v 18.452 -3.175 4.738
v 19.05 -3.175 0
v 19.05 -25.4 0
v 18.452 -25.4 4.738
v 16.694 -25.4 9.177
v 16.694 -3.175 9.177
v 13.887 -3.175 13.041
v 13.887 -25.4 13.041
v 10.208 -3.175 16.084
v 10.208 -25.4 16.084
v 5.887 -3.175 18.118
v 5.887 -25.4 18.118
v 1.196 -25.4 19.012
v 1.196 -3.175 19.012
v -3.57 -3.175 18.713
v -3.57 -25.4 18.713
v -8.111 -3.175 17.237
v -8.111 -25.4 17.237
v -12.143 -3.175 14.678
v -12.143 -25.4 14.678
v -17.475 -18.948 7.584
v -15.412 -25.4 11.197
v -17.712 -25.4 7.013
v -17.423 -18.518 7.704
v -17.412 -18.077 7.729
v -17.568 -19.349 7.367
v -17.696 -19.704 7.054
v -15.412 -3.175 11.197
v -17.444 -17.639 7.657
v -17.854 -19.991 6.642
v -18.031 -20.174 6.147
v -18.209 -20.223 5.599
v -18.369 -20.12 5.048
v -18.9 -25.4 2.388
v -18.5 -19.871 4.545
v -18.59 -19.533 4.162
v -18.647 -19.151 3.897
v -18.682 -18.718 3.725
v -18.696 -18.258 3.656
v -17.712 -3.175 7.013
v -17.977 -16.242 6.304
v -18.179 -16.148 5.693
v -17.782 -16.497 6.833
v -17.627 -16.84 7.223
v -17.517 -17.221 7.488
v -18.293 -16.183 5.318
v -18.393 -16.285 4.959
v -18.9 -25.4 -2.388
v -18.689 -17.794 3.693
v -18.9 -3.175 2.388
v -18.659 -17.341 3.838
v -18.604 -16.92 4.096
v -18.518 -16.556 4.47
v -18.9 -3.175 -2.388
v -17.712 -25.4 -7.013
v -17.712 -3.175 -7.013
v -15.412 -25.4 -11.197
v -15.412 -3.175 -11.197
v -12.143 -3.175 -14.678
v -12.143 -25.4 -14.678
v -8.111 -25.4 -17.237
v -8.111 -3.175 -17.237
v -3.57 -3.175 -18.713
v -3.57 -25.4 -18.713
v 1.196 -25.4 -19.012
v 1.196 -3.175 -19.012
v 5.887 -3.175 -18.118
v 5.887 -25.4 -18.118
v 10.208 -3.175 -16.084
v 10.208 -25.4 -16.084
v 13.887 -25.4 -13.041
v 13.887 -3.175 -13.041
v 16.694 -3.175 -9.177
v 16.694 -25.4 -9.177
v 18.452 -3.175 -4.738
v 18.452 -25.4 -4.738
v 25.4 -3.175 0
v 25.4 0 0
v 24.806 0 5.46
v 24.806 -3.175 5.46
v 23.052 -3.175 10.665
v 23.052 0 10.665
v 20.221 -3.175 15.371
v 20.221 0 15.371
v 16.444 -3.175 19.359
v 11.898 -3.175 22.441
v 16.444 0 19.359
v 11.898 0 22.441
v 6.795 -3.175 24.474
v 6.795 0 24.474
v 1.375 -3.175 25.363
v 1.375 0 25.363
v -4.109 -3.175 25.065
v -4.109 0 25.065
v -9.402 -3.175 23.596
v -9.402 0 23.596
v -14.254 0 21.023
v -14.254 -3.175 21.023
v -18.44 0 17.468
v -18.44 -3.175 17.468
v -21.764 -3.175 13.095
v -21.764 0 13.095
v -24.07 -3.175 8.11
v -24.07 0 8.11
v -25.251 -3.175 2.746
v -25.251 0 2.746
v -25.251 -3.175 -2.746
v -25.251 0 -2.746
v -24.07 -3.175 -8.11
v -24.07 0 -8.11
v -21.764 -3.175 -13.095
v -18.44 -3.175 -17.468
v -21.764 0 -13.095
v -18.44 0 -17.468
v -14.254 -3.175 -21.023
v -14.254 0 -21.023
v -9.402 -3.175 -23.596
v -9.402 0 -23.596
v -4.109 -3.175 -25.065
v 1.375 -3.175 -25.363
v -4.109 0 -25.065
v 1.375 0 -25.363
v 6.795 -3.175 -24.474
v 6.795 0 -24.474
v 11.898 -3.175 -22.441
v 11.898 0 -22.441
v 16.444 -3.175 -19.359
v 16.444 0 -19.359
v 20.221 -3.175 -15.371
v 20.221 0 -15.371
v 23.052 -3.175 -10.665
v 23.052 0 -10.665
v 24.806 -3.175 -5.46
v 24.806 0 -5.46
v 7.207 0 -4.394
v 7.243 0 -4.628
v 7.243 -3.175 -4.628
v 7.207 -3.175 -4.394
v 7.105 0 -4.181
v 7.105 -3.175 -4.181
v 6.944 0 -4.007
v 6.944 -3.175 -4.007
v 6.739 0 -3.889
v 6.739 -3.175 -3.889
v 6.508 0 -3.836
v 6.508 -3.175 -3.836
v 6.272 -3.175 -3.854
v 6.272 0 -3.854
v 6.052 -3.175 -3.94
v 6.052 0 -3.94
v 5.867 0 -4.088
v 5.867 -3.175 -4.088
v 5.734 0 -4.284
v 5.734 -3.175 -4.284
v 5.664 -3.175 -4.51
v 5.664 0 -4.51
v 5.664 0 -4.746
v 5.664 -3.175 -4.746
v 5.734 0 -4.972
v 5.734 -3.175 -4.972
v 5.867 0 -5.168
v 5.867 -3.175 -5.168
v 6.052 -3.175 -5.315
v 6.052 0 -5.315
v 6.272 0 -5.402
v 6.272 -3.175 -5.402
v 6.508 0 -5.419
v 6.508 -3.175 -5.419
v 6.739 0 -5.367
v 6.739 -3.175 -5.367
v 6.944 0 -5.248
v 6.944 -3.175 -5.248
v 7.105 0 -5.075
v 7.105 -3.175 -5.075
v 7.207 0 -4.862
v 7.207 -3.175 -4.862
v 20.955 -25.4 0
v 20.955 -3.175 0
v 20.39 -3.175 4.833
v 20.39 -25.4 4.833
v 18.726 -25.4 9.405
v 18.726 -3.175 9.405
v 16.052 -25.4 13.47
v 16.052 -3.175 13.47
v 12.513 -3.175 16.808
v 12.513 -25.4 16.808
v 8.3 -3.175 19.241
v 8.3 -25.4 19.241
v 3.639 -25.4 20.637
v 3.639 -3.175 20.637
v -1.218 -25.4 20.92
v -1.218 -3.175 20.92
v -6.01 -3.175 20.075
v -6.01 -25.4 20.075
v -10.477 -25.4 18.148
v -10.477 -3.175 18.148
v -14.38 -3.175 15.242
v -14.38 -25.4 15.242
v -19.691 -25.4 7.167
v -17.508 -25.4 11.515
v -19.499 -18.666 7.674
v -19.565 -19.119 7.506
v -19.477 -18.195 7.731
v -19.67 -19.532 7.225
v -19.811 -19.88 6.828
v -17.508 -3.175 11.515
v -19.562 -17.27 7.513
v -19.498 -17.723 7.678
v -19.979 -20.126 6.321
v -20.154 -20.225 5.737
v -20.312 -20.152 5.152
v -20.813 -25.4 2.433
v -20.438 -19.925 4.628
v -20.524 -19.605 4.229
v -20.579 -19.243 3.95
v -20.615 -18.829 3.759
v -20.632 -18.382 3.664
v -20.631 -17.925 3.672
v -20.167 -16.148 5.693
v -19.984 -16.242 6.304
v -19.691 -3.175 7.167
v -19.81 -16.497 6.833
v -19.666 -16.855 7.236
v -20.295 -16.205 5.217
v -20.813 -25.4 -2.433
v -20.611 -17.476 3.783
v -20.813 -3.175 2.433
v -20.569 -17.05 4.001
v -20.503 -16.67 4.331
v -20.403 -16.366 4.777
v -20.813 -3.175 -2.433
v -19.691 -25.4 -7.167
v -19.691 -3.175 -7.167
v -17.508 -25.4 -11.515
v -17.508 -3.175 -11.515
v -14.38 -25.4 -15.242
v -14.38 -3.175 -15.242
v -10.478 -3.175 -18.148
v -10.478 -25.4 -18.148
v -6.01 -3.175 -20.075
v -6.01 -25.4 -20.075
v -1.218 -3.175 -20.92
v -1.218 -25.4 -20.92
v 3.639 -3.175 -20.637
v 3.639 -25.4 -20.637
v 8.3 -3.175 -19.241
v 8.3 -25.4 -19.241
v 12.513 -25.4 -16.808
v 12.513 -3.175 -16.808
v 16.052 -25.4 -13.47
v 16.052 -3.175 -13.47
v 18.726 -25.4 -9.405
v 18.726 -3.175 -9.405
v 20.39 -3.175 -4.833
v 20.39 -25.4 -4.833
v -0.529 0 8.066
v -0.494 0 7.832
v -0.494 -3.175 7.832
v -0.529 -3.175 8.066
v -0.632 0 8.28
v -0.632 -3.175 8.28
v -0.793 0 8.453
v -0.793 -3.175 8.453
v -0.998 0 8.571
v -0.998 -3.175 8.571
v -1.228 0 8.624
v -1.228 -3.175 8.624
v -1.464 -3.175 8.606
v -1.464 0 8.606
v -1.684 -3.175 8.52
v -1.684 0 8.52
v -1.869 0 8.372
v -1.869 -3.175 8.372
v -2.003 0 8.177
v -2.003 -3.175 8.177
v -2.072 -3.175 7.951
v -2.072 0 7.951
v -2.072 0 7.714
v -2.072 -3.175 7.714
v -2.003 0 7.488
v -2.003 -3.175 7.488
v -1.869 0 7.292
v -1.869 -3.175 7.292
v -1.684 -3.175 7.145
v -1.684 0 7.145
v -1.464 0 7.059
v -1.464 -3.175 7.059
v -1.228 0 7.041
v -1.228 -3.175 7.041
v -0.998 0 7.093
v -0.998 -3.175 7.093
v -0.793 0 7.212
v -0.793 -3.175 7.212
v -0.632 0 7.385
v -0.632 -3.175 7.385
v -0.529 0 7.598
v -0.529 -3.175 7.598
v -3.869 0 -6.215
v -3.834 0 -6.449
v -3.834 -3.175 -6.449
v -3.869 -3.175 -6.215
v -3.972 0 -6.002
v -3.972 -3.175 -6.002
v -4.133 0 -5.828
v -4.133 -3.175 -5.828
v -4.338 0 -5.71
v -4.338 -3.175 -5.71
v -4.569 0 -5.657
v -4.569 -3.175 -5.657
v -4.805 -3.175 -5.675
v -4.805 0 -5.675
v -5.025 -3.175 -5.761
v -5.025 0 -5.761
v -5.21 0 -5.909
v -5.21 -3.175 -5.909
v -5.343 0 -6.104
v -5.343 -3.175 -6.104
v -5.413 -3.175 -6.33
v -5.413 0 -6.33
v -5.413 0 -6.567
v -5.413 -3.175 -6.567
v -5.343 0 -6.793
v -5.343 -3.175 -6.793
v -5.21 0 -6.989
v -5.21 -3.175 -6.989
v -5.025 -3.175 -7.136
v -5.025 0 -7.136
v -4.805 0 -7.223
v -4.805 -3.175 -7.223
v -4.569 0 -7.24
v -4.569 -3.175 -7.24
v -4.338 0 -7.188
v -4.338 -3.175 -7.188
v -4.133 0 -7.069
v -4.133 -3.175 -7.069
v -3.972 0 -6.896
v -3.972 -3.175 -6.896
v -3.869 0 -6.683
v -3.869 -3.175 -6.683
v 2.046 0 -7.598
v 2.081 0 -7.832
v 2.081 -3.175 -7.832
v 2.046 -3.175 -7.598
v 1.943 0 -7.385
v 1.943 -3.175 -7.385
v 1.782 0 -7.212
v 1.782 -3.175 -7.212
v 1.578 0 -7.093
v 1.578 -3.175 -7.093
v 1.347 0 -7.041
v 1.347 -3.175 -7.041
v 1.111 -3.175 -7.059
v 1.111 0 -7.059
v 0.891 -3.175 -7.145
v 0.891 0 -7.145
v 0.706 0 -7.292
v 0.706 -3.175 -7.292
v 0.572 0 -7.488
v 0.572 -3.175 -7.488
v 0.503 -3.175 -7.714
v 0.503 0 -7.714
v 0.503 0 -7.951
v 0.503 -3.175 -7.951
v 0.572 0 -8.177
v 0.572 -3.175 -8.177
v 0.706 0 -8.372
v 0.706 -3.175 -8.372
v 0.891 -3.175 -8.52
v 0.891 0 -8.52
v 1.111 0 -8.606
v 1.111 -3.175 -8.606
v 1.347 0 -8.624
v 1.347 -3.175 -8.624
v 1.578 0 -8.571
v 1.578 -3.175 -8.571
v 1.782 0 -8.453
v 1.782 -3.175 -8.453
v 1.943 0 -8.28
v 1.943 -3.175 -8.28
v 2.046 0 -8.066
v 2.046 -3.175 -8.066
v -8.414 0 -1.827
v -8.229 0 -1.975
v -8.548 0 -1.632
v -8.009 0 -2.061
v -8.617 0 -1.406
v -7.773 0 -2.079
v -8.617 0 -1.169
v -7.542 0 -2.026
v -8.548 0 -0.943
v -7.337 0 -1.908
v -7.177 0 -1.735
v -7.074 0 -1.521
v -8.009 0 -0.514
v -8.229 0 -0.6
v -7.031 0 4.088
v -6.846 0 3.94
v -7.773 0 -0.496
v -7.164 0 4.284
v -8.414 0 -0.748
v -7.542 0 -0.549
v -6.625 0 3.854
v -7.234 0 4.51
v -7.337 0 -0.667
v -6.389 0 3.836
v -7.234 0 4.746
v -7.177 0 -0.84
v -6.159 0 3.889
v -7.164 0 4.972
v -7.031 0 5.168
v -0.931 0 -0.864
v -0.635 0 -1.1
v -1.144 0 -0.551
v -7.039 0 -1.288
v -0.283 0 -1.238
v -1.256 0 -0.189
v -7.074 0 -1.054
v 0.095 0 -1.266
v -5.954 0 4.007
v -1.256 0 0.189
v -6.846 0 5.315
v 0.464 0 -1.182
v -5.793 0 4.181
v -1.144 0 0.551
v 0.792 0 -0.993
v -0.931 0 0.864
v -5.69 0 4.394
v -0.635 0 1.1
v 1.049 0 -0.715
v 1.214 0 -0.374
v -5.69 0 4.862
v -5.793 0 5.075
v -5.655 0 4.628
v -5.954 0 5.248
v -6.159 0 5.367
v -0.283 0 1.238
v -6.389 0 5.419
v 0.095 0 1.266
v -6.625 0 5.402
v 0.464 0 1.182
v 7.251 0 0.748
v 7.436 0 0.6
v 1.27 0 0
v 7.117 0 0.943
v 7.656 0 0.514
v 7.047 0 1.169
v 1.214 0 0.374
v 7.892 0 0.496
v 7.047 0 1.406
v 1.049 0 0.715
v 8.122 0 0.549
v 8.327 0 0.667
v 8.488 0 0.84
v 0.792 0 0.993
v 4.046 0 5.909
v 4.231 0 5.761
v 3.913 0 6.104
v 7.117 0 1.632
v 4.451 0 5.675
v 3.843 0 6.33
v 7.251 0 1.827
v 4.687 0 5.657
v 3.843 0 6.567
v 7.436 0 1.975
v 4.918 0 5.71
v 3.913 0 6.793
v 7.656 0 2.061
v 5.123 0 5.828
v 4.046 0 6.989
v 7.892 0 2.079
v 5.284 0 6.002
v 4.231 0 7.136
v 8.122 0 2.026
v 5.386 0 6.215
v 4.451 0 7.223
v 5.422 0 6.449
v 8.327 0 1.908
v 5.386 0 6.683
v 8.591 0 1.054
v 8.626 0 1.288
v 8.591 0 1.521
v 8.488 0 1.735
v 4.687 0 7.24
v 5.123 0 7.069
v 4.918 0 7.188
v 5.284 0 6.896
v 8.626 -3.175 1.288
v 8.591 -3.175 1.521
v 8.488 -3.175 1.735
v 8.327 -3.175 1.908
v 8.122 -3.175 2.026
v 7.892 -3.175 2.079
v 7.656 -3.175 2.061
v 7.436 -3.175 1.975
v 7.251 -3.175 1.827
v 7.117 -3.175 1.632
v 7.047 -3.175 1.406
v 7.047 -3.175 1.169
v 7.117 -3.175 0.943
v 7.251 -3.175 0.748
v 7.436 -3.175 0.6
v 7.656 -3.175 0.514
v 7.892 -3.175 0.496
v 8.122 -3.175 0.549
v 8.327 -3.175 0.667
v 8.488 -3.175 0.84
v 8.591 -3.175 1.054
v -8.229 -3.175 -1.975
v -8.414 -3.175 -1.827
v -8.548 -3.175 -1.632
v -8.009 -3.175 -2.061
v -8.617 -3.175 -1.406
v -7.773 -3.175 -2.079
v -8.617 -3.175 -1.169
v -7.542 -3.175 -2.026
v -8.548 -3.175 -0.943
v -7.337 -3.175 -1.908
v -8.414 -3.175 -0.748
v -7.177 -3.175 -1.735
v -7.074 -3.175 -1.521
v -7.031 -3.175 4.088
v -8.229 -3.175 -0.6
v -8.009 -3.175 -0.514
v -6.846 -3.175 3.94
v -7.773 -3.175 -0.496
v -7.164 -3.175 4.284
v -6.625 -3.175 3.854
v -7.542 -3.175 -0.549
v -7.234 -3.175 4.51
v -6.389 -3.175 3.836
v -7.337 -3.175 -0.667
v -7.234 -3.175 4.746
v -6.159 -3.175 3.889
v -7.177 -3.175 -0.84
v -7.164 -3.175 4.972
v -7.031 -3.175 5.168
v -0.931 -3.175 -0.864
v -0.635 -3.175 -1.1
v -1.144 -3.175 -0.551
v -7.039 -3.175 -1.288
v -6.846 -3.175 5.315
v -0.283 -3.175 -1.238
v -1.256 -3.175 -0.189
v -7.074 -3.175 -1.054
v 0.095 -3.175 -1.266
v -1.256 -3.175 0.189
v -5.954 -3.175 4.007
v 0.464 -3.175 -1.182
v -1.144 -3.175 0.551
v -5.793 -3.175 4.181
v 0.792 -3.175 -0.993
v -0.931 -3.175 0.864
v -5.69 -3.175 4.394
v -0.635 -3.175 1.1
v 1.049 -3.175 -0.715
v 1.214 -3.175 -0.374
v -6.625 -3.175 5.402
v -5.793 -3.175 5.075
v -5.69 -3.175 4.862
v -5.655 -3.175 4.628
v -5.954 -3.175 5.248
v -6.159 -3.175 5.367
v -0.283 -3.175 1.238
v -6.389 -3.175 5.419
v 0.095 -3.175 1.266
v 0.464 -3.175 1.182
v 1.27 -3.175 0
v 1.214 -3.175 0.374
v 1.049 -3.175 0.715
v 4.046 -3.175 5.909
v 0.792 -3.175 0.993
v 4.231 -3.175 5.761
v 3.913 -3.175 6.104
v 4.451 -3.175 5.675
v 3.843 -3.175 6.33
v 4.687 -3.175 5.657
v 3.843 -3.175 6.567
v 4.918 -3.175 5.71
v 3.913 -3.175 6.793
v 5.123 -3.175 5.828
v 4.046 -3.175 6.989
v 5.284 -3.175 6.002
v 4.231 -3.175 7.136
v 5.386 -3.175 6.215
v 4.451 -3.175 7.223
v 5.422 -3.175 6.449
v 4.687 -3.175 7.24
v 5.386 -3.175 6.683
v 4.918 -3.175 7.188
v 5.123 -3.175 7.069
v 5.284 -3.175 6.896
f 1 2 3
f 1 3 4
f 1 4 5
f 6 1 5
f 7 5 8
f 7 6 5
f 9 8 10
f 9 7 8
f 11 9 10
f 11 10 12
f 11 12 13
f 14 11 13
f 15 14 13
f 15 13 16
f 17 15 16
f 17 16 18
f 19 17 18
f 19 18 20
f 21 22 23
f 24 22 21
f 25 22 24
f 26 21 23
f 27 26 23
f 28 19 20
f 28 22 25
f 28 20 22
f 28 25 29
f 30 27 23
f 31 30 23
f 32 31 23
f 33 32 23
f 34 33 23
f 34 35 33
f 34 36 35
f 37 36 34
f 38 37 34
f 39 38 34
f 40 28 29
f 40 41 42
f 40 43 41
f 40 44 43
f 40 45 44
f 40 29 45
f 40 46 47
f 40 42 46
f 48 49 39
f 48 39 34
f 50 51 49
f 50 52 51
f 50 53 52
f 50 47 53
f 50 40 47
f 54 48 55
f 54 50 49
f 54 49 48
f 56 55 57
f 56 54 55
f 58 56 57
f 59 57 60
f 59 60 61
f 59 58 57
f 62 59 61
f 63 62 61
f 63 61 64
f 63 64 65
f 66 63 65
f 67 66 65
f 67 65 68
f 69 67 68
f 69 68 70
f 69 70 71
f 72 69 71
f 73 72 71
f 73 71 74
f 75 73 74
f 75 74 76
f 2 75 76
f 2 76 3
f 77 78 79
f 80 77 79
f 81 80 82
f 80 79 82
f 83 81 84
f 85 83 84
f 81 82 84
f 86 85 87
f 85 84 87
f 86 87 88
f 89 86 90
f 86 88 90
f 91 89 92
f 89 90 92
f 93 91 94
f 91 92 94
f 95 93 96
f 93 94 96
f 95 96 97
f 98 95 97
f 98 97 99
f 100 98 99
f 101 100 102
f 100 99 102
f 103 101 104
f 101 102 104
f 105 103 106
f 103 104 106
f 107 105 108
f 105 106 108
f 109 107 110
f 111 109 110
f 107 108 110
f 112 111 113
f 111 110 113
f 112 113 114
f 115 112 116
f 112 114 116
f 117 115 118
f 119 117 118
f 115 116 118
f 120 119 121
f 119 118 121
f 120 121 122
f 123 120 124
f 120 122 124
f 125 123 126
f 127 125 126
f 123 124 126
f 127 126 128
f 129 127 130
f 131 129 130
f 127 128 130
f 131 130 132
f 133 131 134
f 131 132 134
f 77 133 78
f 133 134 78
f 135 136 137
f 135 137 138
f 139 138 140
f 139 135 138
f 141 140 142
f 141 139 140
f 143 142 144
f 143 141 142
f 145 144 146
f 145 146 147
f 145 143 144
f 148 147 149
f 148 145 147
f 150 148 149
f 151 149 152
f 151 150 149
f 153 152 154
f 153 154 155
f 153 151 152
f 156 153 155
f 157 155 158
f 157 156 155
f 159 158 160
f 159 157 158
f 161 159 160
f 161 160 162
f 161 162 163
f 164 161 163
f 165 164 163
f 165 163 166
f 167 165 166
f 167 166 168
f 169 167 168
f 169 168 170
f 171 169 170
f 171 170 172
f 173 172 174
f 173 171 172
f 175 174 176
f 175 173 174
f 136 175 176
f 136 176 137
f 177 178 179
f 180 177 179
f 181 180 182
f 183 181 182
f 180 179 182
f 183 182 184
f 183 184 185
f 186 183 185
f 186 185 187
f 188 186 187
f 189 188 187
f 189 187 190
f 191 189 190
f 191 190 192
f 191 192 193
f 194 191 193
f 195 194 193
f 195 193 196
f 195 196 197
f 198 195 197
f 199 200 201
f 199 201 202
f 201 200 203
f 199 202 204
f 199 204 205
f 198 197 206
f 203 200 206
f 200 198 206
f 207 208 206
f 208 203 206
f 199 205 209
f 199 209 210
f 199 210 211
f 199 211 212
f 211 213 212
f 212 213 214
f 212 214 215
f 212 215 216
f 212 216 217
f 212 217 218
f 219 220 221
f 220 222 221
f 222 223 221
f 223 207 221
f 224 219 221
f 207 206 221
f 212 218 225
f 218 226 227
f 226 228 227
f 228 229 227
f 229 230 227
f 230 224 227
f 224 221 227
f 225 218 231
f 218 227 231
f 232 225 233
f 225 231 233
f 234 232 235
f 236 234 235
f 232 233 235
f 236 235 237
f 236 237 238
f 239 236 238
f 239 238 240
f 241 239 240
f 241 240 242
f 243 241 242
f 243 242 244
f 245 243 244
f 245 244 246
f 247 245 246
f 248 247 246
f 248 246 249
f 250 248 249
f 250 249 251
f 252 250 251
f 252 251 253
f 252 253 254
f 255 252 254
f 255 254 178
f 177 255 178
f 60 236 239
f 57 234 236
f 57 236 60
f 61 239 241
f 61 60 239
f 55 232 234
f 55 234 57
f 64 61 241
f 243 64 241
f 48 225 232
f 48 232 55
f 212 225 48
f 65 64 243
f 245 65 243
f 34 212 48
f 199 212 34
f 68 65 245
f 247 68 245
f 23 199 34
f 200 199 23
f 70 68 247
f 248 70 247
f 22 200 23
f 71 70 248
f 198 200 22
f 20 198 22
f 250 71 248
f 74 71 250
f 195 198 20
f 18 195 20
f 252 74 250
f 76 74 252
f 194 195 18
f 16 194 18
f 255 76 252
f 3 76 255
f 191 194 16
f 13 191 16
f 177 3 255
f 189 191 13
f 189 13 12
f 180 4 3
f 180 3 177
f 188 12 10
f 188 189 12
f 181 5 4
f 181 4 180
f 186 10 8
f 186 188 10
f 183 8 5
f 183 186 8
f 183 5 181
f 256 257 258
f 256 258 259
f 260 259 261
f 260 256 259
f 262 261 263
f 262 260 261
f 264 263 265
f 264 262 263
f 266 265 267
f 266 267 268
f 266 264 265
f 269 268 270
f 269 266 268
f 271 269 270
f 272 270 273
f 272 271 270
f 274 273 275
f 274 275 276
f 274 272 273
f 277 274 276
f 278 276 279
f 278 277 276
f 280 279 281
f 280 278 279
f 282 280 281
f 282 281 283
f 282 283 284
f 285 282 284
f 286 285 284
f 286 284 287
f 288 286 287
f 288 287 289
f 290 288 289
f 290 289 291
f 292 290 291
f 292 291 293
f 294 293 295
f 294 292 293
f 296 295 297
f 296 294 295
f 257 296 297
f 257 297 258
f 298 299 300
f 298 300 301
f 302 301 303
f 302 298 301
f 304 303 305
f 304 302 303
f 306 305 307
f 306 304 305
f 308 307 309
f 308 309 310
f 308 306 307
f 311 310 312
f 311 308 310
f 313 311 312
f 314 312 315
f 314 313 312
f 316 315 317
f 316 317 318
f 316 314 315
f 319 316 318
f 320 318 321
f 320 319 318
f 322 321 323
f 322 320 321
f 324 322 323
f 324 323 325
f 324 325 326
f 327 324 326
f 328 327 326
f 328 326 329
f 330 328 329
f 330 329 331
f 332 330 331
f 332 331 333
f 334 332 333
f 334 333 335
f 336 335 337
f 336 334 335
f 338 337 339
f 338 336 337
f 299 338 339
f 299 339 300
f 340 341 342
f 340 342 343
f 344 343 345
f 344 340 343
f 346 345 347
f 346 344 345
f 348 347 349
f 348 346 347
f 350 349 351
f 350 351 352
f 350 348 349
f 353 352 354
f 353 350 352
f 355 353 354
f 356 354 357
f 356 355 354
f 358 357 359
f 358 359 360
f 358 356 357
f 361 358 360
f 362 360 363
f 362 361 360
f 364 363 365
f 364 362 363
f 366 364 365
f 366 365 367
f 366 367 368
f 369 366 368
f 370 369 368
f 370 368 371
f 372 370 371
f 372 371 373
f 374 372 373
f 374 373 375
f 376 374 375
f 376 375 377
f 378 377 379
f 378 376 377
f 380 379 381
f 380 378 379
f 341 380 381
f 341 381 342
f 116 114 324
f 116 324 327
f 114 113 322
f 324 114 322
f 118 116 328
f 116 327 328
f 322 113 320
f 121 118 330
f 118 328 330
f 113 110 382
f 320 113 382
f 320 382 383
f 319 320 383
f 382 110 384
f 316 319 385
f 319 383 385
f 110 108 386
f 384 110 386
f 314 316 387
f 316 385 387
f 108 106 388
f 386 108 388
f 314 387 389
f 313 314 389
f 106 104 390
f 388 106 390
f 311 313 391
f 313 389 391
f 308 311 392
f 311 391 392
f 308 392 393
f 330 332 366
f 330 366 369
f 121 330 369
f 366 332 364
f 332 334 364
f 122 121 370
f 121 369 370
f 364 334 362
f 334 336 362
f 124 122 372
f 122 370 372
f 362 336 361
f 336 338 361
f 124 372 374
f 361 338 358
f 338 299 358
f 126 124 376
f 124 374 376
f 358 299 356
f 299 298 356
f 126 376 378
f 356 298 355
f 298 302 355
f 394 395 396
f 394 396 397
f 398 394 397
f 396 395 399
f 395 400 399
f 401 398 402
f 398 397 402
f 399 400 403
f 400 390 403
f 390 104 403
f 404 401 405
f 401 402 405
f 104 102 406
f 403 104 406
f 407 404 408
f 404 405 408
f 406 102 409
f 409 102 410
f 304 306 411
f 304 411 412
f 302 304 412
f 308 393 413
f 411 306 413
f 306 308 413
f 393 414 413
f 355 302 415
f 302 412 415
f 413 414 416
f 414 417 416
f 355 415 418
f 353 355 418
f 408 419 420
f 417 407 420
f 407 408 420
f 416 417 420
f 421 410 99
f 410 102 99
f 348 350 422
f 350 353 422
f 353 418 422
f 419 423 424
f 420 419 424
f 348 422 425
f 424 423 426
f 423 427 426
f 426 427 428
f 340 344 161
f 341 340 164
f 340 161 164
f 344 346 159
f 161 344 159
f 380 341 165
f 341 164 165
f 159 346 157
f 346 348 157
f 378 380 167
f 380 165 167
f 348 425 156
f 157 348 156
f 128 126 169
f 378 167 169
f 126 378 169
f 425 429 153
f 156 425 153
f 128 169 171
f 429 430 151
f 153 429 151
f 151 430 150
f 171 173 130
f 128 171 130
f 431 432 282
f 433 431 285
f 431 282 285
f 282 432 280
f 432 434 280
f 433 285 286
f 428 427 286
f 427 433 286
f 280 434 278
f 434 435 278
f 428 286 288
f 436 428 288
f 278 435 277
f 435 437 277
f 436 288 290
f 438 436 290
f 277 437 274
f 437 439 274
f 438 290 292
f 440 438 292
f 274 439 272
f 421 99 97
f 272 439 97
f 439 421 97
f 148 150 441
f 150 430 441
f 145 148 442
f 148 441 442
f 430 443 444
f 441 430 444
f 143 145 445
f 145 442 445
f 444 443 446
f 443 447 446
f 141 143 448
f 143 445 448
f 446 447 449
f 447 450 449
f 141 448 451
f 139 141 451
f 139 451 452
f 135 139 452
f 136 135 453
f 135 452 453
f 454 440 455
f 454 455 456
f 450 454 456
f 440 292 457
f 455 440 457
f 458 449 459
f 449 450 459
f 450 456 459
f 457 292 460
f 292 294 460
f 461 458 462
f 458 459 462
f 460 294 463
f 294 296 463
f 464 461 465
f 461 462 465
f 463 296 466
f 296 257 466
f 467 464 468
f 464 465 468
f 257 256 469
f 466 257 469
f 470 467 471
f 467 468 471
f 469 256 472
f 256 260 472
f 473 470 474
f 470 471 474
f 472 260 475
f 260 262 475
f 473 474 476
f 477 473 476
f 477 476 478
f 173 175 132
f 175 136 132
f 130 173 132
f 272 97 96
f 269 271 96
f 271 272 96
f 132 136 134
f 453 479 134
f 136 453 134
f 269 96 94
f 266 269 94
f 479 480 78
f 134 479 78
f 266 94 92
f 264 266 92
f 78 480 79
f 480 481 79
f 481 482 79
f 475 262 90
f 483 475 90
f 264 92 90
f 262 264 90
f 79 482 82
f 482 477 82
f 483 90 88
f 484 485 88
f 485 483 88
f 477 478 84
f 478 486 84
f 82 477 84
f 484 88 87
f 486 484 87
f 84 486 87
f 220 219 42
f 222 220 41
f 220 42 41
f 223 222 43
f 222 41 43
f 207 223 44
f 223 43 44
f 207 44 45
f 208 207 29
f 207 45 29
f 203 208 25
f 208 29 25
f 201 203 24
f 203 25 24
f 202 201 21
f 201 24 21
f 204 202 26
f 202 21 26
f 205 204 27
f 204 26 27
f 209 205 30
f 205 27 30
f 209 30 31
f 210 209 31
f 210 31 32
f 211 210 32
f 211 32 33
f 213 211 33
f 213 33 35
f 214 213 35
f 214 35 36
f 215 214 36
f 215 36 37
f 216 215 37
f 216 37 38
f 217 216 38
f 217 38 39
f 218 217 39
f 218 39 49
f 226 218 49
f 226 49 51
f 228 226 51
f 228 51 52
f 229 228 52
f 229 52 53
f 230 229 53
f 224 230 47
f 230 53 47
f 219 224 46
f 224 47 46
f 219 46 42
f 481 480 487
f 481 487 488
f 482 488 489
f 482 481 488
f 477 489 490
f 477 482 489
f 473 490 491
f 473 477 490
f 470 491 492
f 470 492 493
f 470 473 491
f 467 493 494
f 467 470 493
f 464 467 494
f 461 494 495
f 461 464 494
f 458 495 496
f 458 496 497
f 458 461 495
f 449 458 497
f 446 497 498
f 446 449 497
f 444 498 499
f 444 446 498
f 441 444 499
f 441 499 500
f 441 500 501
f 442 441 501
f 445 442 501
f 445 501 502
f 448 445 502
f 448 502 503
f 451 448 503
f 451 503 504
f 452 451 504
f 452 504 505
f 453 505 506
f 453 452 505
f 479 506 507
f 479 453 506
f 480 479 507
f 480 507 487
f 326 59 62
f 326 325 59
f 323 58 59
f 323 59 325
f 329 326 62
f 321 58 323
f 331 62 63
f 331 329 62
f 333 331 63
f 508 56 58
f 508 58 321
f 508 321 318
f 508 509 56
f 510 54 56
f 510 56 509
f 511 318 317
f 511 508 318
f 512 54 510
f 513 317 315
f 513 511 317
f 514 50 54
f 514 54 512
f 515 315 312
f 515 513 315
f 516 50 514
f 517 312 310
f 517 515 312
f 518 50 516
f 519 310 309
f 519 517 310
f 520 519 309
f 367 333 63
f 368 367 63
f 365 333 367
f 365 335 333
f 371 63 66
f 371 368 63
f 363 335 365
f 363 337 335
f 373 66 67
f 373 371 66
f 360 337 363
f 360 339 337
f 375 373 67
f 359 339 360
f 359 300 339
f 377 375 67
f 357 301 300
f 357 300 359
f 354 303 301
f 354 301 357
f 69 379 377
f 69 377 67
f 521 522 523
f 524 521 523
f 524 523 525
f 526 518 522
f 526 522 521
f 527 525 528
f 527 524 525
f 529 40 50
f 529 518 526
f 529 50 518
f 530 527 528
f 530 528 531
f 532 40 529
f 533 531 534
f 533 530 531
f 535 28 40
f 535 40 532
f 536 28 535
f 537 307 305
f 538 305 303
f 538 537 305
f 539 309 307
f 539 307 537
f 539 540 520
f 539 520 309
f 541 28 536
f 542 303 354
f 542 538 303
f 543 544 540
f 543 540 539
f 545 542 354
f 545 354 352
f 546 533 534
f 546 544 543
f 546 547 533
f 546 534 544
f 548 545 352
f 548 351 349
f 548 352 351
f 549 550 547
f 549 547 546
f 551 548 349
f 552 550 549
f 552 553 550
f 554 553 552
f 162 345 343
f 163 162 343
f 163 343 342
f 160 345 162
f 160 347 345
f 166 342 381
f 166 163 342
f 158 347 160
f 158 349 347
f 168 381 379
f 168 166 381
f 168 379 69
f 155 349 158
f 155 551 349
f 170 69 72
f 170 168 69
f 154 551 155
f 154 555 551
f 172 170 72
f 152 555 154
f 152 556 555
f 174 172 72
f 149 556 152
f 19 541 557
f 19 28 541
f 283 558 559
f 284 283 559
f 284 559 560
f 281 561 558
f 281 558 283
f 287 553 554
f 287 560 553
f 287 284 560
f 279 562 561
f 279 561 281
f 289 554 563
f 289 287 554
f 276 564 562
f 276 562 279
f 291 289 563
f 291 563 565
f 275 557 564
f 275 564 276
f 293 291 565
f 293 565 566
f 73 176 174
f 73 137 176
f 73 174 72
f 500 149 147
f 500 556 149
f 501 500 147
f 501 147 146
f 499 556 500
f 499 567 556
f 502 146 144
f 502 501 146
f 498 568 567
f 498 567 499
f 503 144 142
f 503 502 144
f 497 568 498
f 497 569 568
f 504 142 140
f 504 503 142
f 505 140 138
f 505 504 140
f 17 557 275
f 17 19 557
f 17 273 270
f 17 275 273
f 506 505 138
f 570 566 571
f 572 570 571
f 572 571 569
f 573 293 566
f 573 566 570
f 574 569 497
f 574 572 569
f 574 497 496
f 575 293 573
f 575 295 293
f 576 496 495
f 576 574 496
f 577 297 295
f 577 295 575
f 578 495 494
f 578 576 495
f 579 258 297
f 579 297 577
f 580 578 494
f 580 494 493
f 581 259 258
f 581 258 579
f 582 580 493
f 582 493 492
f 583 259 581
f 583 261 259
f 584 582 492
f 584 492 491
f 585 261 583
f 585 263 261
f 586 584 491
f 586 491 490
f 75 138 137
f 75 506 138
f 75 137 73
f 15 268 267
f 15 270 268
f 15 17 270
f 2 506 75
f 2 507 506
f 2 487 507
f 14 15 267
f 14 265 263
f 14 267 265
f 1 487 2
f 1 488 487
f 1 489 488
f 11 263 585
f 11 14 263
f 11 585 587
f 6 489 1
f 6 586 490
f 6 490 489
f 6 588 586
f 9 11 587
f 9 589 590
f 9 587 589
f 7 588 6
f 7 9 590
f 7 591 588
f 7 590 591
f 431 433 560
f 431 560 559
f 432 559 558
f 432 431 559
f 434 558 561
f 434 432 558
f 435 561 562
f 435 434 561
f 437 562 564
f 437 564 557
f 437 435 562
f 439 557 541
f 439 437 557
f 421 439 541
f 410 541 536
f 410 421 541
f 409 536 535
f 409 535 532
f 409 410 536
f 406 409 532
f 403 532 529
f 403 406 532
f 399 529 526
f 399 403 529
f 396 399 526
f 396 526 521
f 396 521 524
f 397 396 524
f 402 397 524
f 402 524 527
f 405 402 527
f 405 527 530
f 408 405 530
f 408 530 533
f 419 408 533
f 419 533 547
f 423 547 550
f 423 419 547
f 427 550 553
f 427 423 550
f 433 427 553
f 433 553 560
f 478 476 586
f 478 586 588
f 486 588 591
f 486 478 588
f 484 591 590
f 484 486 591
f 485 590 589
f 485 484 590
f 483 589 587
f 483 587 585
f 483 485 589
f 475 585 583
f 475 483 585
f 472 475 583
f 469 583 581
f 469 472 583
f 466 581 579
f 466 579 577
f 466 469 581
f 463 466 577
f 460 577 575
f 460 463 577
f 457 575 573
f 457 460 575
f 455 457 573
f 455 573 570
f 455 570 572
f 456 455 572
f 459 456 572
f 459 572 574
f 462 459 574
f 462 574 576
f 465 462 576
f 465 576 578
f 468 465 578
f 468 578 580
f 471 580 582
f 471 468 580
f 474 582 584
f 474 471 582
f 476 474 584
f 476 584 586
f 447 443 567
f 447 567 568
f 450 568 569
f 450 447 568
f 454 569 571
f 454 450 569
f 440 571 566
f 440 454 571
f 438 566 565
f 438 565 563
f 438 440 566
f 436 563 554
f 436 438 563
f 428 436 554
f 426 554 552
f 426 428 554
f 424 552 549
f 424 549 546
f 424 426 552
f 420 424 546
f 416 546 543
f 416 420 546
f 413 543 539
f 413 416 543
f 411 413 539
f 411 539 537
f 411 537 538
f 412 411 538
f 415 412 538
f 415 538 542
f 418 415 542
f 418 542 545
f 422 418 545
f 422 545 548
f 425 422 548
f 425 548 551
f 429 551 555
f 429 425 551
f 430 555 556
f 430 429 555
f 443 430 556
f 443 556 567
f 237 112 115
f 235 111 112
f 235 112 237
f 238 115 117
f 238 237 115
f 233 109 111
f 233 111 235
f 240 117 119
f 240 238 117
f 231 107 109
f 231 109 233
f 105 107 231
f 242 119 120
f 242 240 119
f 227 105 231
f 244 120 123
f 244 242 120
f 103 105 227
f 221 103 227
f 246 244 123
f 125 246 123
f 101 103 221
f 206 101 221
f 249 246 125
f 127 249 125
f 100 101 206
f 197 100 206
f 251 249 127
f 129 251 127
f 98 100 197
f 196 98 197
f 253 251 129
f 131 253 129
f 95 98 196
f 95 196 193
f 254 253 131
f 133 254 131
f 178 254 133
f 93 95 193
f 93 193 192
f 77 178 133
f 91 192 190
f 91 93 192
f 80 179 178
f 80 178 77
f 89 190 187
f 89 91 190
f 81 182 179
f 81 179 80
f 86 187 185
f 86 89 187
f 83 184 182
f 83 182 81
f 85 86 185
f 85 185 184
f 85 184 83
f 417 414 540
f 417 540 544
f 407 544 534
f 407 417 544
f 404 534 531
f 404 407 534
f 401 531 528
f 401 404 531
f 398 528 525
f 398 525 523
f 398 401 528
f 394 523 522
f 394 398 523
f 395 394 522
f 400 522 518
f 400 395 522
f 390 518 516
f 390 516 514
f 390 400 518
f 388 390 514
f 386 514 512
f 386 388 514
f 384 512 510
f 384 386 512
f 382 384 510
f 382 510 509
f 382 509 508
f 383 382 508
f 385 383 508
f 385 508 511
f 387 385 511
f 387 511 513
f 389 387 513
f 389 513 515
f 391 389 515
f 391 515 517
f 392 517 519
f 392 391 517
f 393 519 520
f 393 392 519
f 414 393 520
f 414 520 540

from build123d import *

# Parameters (mm, degrees)
F0_R     = 25.4
F0_R_2   = 20.955
F0_R_3   = 19.05
F0_R_4   = 0.79375
F0_R_5   = 1.27
F1_DEPTH = 3.175
F2_DEPTH = 25.4
F3_R     = 2.038323
F4_DEPTH = 25.4


with BuildPart() as f1:
    # F0 (on Front) → F1 (new body)
    with BuildSketch(Plane.XZ):
        Circle(F0_R)
        Circle(F0_R_2, mode=Mode.SUBTRACT)
        Circle(F0_R_3)
        with Locations((-4.627904, -6.448753)):
            Circle(F0_R_4, mode=Mode.SUBTRACT)
        with Locations((-7.832379, -1.287535)):
            Circle(F0_R_4, mode=Mode.SUBTRACT)
        Circle(F0_R_5, mode=Mode.SUBTRACT)
        with Locations((1.287535, -7.832379)):
            Circle(F0_R_4, mode=Mode.SUBTRACT)
        with Locations((6.448753, -4.627904)):
            Circle(F0_R_4, mode=Mode.SUBTRACT)
        with Locations((-6.448753, 4.627904)):
            Circle(F0_R_4, mode=Mode.SUBTRACT)
        with Locations((-1.287535, 7.832379)):
            Circle(F0_R_4, mode=Mode.SUBTRACT)
        with Locations((7.832379, 1.287535)):
            Circle(F0_R_4, mode=Mode.SUBTRACT)
        with Locations((4.627904, 6.448753)):
            Circle(F0_R_4, mode=Mode.SUBTRACT)
    extrude(amount=F1_DEPTH)

    # F0 (on Front) → F2 (join)
    with BuildSketch(Plane.XZ):
        Circle(F0_R_2)
        Circle(F0_R_3, mode=Mode.SUBTRACT)
    extrude(amount=F2_DEPTH)

    # F3 (on Right) → F4 (cut)
    with BuildSketch(Plane.YZ):
        with Locations((-18.186759, 5.693154)):
            Circle(F3_R)
    extrude(amount=-F4_DEPTH, mode=Mode.SUBTRACT)


solid = f1.part
